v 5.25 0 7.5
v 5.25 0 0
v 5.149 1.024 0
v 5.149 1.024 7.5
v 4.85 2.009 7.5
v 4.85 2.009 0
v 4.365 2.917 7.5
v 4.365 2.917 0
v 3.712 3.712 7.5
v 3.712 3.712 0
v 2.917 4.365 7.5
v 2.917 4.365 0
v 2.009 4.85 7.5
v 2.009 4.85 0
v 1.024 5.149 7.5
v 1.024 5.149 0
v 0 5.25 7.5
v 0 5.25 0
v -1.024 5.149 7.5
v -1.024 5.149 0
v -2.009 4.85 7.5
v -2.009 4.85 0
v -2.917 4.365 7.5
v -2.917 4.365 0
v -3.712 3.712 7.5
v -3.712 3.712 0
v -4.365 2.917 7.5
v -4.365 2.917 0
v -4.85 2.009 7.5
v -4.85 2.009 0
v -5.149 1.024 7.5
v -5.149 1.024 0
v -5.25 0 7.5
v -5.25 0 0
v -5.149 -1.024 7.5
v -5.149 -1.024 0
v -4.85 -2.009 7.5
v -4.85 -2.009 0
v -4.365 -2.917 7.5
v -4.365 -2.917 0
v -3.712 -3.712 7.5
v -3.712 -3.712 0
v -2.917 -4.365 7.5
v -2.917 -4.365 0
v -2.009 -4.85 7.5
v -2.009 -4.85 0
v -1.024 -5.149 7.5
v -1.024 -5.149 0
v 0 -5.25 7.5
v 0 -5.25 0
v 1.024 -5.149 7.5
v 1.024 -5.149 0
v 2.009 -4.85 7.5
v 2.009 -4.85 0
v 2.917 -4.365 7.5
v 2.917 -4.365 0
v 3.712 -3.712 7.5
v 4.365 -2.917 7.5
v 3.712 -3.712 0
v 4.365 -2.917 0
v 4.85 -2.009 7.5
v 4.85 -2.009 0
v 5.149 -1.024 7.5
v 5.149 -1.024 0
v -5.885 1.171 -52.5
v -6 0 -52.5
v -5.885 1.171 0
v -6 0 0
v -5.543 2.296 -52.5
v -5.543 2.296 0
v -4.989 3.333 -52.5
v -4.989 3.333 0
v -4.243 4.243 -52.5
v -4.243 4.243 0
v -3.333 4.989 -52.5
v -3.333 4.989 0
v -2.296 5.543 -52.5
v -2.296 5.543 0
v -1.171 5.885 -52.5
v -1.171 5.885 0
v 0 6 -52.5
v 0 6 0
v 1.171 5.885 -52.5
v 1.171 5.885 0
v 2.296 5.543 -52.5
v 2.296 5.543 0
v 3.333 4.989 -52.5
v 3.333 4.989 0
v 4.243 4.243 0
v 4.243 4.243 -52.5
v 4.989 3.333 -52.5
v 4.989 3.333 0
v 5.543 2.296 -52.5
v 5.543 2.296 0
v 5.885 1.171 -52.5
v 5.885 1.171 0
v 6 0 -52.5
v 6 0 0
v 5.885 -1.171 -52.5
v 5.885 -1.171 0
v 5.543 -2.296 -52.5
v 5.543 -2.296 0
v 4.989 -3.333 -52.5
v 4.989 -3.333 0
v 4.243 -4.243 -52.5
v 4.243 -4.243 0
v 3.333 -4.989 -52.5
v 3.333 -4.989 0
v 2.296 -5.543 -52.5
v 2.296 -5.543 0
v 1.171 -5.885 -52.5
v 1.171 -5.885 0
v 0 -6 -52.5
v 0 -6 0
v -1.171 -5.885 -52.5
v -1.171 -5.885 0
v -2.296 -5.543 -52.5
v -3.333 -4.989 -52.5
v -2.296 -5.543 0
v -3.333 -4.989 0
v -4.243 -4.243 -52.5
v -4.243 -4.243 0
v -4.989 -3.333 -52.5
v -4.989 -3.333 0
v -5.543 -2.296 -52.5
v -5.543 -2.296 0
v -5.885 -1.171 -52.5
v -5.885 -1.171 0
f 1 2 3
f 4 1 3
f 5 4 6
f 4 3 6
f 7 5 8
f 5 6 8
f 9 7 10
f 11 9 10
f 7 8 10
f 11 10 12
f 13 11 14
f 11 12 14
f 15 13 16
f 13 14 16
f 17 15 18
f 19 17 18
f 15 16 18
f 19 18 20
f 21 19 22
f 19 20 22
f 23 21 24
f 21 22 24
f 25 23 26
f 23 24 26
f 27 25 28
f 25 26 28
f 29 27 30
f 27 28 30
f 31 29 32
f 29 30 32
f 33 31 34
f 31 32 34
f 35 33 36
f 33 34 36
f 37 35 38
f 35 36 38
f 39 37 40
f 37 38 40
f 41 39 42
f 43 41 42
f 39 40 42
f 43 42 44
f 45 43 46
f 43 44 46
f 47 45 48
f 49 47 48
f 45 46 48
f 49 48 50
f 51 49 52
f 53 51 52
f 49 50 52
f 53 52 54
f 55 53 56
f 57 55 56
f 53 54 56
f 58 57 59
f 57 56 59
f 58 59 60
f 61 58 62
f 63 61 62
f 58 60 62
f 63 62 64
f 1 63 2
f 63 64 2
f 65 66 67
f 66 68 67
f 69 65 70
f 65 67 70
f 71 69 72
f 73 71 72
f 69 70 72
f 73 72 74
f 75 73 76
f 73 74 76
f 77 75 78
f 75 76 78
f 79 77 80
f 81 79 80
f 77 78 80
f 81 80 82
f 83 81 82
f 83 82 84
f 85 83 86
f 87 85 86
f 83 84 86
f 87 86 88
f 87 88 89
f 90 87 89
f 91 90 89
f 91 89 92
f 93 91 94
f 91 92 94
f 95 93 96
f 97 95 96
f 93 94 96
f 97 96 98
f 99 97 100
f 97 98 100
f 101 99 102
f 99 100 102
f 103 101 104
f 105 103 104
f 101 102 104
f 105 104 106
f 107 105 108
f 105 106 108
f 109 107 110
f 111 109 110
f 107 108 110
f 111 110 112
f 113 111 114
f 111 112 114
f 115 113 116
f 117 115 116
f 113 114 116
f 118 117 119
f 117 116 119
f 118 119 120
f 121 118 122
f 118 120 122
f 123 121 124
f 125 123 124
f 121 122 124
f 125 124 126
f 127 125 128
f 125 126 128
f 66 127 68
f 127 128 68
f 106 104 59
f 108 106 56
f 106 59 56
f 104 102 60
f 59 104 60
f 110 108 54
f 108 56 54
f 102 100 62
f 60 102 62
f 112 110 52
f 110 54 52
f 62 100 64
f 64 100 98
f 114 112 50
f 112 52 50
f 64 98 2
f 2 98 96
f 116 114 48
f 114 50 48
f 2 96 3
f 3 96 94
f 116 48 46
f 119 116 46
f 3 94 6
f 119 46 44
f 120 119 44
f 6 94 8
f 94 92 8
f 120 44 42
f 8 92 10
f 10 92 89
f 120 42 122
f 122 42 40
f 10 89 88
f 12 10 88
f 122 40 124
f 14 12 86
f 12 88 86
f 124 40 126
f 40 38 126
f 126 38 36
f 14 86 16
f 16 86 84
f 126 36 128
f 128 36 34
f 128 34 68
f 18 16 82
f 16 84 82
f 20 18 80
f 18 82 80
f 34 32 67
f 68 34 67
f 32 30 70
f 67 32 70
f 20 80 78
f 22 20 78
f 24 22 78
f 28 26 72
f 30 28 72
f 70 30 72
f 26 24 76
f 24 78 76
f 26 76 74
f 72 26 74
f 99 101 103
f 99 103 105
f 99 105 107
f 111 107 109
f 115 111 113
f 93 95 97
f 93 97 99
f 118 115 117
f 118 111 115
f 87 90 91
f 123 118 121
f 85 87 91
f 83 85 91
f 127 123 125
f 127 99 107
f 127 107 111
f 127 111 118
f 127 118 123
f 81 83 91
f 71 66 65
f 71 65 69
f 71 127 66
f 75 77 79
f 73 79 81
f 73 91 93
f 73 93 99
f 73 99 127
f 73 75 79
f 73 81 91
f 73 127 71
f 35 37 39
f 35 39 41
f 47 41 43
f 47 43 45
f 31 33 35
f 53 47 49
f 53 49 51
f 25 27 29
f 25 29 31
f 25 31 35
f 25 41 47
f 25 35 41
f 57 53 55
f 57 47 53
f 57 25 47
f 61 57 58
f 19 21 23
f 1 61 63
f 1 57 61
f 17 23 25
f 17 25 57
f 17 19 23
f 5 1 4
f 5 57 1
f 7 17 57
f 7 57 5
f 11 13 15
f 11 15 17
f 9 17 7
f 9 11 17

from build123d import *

# Parameters (mm, degrees)
SKETCH_1_R      = 5.25
EXTRUDE_1_DEPTH = 7.5
SKETCH_2_R      = 6
EXTRUDE_2_DEPTH = 42.5
SKETCH_3_R      = 6
EXTRUDE_3_DEPTH = 10


with BuildPart() as part:
    # 草图1 → 凸台-拉伸1 (new body)
    with BuildSketch(Plane.XY):
        Circle(SKETCH_1_R)
    extrude(amount=EXTRUDE_1_DEPTH)

    # 草图2 → 凸台-拉伸2 (add)
    with BuildSketch(Plane(origin=(0, 0, 0), x_dir=(-1, 0, 0), z_dir=(0, 0, -1))):
        Circle(SKETCH_2_R)
    extrude(amount=EXTRUDE_2_DEPTH)

    # 草图3 → 凸台-拉伸3 (add)
    with BuildSketch(Plane(origin=(0, 0, -42.5), x_dir=(-1, 0, 0), z_dir=(0, 0, -1))):
        Circle(SKETCH_3_R)
    extrude(amount=EXTRUDE_3_DEPTH)


solid = part.part
